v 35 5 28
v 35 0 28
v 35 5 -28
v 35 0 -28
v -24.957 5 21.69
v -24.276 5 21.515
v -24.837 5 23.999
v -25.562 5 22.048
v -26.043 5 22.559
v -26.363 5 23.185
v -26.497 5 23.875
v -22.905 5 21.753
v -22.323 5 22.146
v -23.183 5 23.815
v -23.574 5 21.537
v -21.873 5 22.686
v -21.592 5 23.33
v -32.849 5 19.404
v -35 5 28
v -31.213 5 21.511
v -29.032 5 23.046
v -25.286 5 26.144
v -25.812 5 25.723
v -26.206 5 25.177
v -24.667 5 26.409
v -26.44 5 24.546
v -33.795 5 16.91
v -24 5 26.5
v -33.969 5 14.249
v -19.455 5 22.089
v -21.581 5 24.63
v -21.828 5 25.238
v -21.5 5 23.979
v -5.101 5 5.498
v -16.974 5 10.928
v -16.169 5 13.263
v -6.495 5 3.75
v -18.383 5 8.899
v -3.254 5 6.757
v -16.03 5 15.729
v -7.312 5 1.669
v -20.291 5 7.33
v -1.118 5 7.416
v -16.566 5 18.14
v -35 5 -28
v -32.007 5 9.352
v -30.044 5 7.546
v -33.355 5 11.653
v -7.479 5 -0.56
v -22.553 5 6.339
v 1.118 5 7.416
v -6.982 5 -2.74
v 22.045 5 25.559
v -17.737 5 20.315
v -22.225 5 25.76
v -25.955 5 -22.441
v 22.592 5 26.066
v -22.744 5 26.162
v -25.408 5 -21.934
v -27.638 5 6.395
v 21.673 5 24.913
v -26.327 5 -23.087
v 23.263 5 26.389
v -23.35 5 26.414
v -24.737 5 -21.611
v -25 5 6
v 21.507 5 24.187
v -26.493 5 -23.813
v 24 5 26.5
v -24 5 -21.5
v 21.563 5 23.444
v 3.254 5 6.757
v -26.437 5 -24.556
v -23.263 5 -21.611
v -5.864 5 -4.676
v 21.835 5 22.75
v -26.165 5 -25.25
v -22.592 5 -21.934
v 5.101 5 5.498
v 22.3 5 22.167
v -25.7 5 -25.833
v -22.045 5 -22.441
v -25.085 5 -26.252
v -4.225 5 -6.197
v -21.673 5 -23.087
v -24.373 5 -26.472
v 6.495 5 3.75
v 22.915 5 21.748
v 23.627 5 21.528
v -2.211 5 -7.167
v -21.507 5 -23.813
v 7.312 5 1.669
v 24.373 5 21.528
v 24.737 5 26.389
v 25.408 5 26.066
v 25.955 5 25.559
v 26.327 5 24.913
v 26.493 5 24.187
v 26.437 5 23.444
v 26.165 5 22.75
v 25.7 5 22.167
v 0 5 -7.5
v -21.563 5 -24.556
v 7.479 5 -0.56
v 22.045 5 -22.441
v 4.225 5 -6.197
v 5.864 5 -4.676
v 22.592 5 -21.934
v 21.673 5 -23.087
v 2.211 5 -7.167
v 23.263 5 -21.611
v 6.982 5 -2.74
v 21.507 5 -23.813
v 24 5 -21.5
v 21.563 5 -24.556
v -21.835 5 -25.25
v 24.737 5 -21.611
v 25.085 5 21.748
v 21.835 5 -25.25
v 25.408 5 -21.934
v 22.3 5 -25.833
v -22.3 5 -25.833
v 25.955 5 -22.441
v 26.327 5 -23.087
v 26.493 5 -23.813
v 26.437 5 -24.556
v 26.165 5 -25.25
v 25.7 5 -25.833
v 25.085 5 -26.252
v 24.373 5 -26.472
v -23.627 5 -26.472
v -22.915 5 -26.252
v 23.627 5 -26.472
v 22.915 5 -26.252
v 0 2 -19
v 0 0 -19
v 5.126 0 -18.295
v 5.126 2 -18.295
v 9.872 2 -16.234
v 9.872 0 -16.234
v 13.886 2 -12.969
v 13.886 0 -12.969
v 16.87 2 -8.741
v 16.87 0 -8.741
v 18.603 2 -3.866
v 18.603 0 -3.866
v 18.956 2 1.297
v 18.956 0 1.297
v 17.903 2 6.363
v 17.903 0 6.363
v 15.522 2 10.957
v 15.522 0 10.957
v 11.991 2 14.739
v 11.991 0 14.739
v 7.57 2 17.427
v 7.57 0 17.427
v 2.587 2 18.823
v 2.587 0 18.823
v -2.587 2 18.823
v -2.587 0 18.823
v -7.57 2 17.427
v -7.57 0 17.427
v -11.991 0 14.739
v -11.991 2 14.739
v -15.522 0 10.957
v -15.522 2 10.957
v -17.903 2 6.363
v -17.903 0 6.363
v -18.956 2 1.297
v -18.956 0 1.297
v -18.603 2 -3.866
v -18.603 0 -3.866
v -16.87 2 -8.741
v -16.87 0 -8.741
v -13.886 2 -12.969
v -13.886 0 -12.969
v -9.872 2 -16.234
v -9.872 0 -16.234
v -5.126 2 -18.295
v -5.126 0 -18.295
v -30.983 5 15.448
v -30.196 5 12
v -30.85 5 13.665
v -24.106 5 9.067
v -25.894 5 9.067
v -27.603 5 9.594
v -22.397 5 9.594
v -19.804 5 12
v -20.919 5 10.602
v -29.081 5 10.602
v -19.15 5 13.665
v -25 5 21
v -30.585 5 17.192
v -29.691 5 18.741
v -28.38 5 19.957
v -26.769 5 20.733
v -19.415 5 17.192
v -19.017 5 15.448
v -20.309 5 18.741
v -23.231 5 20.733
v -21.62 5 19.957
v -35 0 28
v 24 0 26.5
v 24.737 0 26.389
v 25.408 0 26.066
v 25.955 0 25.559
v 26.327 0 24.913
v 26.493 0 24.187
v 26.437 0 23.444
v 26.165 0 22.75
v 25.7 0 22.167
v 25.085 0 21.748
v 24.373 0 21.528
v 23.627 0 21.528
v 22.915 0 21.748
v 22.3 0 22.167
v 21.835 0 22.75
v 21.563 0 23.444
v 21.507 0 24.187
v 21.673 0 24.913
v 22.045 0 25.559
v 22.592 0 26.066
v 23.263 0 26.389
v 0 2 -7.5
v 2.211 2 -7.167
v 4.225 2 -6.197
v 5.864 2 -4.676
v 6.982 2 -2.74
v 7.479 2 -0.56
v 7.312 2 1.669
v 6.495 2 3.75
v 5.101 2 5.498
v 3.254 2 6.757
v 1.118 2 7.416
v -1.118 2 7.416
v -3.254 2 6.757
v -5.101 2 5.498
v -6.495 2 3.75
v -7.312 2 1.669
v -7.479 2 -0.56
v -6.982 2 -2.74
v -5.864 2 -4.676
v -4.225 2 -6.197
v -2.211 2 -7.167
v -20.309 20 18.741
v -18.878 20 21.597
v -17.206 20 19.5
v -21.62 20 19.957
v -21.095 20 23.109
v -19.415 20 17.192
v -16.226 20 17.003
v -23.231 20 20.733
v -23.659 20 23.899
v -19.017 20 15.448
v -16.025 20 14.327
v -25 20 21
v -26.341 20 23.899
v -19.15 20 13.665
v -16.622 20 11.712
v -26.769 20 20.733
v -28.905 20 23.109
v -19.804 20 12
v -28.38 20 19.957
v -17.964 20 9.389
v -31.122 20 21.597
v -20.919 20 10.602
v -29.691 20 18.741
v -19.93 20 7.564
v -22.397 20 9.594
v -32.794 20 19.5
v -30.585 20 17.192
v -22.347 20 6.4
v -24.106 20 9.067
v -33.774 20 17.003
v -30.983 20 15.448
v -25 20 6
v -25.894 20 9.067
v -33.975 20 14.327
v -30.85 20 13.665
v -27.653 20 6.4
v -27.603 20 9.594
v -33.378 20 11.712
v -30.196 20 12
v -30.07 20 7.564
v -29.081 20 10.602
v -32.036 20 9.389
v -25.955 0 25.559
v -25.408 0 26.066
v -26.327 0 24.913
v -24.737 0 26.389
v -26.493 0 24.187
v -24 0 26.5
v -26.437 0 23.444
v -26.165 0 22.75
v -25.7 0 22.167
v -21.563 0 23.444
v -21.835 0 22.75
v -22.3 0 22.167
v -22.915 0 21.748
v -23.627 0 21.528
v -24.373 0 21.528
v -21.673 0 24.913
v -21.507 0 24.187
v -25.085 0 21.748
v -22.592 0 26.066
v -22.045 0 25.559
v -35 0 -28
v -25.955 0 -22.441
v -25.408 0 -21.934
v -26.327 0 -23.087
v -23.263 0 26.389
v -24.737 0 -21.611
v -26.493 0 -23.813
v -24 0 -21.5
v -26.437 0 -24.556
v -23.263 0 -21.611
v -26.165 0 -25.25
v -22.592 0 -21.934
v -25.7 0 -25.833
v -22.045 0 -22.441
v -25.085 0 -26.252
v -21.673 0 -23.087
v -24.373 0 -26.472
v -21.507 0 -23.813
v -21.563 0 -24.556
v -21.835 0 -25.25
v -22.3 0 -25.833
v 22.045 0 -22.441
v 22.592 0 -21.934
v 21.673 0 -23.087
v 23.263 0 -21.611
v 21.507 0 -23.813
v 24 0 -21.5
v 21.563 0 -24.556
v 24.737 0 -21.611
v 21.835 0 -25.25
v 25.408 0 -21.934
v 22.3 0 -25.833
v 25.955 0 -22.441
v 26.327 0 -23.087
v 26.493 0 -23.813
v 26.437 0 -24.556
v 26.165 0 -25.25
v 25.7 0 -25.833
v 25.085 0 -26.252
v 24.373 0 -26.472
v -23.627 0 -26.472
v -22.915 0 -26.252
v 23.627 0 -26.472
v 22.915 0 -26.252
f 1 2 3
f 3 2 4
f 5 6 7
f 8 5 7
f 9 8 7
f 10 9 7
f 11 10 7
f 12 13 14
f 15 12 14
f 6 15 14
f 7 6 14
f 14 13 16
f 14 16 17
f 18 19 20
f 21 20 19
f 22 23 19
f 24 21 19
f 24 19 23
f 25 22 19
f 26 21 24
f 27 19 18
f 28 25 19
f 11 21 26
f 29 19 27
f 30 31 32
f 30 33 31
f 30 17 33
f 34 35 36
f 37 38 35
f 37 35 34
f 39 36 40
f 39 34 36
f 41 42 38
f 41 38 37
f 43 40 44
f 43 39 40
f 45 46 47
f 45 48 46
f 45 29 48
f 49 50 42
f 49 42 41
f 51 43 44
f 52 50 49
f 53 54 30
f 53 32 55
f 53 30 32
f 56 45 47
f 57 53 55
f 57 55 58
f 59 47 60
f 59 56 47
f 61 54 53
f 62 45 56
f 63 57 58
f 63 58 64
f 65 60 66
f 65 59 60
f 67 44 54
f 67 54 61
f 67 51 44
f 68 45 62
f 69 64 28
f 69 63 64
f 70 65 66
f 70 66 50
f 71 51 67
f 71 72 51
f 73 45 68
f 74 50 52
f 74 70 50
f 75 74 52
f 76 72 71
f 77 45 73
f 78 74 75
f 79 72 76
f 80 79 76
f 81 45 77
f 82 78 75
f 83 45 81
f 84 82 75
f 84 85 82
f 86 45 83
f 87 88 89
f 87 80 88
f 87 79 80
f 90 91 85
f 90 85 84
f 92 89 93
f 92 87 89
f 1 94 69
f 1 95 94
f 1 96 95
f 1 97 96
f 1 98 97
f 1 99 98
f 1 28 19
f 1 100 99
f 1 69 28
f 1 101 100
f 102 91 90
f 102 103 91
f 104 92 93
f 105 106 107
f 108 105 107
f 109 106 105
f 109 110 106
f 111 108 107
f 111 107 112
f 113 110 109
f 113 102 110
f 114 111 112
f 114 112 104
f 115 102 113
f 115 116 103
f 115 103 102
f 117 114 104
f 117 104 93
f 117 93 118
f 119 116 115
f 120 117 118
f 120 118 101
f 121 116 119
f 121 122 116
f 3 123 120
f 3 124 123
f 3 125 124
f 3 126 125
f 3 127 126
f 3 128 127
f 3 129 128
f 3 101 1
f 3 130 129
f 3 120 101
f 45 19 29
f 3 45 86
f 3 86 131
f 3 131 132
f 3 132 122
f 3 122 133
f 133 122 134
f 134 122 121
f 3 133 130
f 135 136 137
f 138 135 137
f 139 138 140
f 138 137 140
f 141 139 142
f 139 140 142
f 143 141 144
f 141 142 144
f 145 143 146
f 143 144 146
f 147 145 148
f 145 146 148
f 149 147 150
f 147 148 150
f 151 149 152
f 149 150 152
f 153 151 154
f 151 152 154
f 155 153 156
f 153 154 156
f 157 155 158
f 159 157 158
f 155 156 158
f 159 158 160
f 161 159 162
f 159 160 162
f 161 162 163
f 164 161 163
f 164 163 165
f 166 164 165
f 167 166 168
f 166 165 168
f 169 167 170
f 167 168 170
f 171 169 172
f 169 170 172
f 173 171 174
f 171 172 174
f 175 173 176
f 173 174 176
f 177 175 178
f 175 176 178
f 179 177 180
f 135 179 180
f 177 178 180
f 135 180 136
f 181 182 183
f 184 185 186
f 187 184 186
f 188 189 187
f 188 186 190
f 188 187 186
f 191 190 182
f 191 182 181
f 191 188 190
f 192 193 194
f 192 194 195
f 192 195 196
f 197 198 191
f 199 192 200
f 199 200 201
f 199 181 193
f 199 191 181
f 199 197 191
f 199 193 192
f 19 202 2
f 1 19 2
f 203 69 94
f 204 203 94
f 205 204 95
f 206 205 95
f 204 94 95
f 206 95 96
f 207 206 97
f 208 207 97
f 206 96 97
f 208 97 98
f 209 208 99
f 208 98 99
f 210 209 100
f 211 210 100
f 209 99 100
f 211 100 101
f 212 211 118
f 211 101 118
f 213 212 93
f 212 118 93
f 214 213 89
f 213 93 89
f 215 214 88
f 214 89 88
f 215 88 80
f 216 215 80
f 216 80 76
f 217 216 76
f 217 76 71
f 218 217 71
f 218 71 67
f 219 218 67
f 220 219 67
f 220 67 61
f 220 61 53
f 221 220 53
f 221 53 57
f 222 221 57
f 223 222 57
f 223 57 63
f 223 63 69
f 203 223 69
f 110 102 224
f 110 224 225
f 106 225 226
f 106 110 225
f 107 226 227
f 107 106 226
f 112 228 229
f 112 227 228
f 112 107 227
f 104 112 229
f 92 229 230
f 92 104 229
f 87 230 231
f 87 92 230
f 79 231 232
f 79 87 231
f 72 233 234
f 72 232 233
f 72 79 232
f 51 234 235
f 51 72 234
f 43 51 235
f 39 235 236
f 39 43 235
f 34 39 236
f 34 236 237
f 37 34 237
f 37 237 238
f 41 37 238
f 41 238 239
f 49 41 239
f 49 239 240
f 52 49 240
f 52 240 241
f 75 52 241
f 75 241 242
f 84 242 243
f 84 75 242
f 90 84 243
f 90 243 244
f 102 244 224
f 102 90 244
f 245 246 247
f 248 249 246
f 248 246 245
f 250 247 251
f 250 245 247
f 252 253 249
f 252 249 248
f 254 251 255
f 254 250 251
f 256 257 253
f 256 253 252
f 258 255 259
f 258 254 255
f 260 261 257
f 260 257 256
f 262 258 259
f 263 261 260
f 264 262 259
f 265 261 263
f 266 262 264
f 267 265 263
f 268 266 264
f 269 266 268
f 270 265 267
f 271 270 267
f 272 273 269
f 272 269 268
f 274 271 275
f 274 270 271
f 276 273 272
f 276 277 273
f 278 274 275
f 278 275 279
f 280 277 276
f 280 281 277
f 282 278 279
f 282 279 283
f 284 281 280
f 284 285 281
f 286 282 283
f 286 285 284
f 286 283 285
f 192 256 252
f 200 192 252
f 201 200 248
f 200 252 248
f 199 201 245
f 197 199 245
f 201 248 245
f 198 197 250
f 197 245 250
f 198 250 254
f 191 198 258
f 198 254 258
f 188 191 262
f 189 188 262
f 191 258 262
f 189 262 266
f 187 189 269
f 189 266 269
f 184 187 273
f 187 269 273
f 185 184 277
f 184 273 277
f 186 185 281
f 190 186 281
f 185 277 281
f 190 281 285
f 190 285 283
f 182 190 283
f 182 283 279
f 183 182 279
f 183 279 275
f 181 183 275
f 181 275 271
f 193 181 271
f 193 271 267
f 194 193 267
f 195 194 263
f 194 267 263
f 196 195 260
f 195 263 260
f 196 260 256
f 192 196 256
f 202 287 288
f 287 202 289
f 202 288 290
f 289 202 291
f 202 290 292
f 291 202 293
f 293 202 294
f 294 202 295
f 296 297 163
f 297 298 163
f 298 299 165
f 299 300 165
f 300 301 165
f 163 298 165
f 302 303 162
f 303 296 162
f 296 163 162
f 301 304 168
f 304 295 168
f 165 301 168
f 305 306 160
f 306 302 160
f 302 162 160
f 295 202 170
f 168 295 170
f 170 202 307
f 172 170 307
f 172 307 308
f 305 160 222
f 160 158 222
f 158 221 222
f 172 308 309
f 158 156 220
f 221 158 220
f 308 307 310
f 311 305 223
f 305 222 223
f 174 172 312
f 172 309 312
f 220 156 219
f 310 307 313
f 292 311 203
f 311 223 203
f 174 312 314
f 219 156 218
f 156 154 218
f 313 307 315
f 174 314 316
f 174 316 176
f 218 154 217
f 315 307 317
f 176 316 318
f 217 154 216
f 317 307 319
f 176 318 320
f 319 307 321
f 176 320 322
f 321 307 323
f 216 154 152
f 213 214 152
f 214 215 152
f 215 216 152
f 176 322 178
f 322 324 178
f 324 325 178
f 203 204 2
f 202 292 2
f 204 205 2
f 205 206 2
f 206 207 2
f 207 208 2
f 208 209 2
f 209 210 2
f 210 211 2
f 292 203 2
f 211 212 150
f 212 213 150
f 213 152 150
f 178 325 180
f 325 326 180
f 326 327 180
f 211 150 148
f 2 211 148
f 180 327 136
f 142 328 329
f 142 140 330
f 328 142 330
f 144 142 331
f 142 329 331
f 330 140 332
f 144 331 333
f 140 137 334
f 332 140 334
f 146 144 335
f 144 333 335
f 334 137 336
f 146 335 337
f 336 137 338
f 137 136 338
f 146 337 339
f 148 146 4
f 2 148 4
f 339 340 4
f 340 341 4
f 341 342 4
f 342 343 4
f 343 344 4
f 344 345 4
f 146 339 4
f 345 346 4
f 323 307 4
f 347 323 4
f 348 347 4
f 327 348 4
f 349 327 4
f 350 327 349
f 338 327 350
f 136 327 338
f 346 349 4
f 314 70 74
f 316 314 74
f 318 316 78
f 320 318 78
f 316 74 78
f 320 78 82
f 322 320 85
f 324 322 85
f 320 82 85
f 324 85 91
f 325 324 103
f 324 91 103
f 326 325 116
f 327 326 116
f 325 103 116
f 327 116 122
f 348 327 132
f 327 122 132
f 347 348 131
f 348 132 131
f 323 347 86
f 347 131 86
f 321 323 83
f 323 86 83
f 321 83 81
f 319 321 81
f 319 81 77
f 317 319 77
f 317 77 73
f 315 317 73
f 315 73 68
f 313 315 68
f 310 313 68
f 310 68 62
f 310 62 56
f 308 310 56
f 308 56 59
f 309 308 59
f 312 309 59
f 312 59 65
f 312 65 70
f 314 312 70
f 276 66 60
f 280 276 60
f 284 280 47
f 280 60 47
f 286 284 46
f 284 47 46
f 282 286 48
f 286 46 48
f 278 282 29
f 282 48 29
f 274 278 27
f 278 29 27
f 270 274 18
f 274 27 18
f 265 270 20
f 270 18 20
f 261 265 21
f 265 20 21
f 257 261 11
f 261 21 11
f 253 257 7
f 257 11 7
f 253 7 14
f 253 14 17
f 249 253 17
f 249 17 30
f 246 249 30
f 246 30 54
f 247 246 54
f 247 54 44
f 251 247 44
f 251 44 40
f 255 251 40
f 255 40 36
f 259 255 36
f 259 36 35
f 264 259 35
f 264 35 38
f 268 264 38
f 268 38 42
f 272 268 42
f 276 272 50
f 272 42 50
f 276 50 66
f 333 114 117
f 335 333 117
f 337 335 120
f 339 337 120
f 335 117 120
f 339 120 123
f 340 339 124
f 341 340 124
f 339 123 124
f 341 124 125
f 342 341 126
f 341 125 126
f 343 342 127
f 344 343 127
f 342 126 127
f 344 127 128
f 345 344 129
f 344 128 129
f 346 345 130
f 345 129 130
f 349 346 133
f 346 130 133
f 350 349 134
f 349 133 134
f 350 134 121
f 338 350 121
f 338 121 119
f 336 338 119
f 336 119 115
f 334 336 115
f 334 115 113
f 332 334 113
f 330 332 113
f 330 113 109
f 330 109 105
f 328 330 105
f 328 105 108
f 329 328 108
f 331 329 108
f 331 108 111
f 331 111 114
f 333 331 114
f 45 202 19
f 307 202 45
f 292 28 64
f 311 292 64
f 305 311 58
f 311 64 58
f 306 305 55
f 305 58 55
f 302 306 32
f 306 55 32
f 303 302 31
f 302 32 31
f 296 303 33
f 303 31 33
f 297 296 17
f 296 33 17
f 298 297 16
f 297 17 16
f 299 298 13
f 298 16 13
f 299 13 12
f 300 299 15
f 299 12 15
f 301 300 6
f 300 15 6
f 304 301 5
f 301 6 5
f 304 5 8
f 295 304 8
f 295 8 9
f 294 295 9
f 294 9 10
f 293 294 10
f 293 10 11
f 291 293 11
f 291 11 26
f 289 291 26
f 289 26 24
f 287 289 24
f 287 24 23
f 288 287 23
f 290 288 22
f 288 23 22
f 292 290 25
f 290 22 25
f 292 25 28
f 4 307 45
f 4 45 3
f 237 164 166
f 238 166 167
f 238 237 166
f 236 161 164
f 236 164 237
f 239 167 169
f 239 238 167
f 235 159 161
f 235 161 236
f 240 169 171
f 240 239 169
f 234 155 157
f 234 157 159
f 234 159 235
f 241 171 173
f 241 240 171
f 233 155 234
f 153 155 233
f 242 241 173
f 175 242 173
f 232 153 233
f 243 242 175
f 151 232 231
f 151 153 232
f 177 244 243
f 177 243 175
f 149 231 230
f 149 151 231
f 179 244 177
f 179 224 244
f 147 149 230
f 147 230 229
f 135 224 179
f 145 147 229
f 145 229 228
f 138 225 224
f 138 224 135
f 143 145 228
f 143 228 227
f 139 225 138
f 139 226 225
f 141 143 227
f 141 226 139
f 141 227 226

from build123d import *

# Parameters (mm, degrees)
SKETCH1_W               = 70
SKETCH1_H               = 56
BOSS_EXTRUDE1_DEPTH     = 5
SKETCH2_R               = 9
BOSS_EXTRUDE2_DEPTH     = 15
SKETCH4_R               = 19
CUT_EXTRUDE2_DEPTH      = 2
CUT_EXTRUDE3_DEPTH      = 49.301138703
CUT_EXTRUDE3_DEPTH_BACK = 49.301138703
SKETCH5_R               = 7.5
SKETCH6_R               = 6
CUT_EXTRUDE4_DEPTH      = 15
SKETCH7_R               = 2.5
CUT_EXTRUDE5_DEPTH      = 48.265209192


with BuildPart() as part:
    # Sketch1 → Boss-Extrude1 (new body)
    with BuildSketch(Plane(origin=(0, 0, 0), x_dir=(1, 0, 0), z_dir=(0, 1, 0))):
        Rectangle(SKETCH1_W, SKETCH1_H)
    extrude(amount=BOSS_EXTRUDE1_DEPTH)

    # Sketch2 → Boss-Extrude2 (add)
    with BuildSketch(Plane(origin=(0, 5, 0), x_dir=(1, 0, 0), z_dir=(0, 1, 0))):
        with Locations(Location((-25, -15, 0), (0, 0, 90))):
            Circle(SKETCH2_R)
    extrude(amount=BOSS_EXTRUDE2_DEPTH)

    # Sketch4 → Cut-Extrude2 (cut)
    with BuildSketch(Plane.XZ):
        with Locations(Location((0, 0, 0), (0, 0, 270))):
            Circle(SKETCH4_R)
    extrude(amount=-CUT_EXTRUDE2_DEPTH, mode=Mode.SUBTRACT)

    # Sketch5 → Cut-Extrude3 (cut, two sides: drawn at the far end of the back side and taken through both)
    with BuildSketch(Plane.XZ.offset(-2).offset(-CUT_EXTRUDE3_DEPTH_BACK)):
        with Locations(Location((0, 0, 0), (0, 0, 270))):
            Circle(SKETCH5_R)
    extrude(amount=CUT_EXTRUDE3_DEPTH + CUT_EXTRUDE3_DEPTH_BACK, mode=Mode.SUBTRACT)

    # Sketch6 → Cut-Extrude4 (cut)
    with BuildSketch(Plane(origin=(0, 20, 0), x_dir=(1, 0, 0), z_dir=(0, 1, 0))):
        with Locations(Location((-25, -15, 0), (0, 0, 270))):
            Circle(SKETCH6_R)
    extrude(amount=-CUT_EXTRUDE4_DEPTH, mode=Mode.SUBTRACT)

    # Sketch7 → Cut-Extrude5 (cut, through all)
    with BuildSketch(Plane(origin=(0, 5, 0), x_dir=(1, 0, 0), z_dir=(0, 1, 0))):
        with Locations(Location((-24, 24, 0), (0, 0, 270))):
            Circle(SKETCH7_R)
        with Locations(Location((24, 24, 0), (0, 0, 270))):
            Circle(SKETCH7_R)
        with Locations(Location((24, -24, 0), (0, 0, 270))):
            Circle(SKETCH7_R)
        with Locations(Location((-24, -24, 0), (0, 0, 270))):
            Circle(SKETCH7_R)
    extrude(amount=-CUT_EXTRUDE5_DEPTH, mode=Mode.SUBTRACT)


solid = part.part
